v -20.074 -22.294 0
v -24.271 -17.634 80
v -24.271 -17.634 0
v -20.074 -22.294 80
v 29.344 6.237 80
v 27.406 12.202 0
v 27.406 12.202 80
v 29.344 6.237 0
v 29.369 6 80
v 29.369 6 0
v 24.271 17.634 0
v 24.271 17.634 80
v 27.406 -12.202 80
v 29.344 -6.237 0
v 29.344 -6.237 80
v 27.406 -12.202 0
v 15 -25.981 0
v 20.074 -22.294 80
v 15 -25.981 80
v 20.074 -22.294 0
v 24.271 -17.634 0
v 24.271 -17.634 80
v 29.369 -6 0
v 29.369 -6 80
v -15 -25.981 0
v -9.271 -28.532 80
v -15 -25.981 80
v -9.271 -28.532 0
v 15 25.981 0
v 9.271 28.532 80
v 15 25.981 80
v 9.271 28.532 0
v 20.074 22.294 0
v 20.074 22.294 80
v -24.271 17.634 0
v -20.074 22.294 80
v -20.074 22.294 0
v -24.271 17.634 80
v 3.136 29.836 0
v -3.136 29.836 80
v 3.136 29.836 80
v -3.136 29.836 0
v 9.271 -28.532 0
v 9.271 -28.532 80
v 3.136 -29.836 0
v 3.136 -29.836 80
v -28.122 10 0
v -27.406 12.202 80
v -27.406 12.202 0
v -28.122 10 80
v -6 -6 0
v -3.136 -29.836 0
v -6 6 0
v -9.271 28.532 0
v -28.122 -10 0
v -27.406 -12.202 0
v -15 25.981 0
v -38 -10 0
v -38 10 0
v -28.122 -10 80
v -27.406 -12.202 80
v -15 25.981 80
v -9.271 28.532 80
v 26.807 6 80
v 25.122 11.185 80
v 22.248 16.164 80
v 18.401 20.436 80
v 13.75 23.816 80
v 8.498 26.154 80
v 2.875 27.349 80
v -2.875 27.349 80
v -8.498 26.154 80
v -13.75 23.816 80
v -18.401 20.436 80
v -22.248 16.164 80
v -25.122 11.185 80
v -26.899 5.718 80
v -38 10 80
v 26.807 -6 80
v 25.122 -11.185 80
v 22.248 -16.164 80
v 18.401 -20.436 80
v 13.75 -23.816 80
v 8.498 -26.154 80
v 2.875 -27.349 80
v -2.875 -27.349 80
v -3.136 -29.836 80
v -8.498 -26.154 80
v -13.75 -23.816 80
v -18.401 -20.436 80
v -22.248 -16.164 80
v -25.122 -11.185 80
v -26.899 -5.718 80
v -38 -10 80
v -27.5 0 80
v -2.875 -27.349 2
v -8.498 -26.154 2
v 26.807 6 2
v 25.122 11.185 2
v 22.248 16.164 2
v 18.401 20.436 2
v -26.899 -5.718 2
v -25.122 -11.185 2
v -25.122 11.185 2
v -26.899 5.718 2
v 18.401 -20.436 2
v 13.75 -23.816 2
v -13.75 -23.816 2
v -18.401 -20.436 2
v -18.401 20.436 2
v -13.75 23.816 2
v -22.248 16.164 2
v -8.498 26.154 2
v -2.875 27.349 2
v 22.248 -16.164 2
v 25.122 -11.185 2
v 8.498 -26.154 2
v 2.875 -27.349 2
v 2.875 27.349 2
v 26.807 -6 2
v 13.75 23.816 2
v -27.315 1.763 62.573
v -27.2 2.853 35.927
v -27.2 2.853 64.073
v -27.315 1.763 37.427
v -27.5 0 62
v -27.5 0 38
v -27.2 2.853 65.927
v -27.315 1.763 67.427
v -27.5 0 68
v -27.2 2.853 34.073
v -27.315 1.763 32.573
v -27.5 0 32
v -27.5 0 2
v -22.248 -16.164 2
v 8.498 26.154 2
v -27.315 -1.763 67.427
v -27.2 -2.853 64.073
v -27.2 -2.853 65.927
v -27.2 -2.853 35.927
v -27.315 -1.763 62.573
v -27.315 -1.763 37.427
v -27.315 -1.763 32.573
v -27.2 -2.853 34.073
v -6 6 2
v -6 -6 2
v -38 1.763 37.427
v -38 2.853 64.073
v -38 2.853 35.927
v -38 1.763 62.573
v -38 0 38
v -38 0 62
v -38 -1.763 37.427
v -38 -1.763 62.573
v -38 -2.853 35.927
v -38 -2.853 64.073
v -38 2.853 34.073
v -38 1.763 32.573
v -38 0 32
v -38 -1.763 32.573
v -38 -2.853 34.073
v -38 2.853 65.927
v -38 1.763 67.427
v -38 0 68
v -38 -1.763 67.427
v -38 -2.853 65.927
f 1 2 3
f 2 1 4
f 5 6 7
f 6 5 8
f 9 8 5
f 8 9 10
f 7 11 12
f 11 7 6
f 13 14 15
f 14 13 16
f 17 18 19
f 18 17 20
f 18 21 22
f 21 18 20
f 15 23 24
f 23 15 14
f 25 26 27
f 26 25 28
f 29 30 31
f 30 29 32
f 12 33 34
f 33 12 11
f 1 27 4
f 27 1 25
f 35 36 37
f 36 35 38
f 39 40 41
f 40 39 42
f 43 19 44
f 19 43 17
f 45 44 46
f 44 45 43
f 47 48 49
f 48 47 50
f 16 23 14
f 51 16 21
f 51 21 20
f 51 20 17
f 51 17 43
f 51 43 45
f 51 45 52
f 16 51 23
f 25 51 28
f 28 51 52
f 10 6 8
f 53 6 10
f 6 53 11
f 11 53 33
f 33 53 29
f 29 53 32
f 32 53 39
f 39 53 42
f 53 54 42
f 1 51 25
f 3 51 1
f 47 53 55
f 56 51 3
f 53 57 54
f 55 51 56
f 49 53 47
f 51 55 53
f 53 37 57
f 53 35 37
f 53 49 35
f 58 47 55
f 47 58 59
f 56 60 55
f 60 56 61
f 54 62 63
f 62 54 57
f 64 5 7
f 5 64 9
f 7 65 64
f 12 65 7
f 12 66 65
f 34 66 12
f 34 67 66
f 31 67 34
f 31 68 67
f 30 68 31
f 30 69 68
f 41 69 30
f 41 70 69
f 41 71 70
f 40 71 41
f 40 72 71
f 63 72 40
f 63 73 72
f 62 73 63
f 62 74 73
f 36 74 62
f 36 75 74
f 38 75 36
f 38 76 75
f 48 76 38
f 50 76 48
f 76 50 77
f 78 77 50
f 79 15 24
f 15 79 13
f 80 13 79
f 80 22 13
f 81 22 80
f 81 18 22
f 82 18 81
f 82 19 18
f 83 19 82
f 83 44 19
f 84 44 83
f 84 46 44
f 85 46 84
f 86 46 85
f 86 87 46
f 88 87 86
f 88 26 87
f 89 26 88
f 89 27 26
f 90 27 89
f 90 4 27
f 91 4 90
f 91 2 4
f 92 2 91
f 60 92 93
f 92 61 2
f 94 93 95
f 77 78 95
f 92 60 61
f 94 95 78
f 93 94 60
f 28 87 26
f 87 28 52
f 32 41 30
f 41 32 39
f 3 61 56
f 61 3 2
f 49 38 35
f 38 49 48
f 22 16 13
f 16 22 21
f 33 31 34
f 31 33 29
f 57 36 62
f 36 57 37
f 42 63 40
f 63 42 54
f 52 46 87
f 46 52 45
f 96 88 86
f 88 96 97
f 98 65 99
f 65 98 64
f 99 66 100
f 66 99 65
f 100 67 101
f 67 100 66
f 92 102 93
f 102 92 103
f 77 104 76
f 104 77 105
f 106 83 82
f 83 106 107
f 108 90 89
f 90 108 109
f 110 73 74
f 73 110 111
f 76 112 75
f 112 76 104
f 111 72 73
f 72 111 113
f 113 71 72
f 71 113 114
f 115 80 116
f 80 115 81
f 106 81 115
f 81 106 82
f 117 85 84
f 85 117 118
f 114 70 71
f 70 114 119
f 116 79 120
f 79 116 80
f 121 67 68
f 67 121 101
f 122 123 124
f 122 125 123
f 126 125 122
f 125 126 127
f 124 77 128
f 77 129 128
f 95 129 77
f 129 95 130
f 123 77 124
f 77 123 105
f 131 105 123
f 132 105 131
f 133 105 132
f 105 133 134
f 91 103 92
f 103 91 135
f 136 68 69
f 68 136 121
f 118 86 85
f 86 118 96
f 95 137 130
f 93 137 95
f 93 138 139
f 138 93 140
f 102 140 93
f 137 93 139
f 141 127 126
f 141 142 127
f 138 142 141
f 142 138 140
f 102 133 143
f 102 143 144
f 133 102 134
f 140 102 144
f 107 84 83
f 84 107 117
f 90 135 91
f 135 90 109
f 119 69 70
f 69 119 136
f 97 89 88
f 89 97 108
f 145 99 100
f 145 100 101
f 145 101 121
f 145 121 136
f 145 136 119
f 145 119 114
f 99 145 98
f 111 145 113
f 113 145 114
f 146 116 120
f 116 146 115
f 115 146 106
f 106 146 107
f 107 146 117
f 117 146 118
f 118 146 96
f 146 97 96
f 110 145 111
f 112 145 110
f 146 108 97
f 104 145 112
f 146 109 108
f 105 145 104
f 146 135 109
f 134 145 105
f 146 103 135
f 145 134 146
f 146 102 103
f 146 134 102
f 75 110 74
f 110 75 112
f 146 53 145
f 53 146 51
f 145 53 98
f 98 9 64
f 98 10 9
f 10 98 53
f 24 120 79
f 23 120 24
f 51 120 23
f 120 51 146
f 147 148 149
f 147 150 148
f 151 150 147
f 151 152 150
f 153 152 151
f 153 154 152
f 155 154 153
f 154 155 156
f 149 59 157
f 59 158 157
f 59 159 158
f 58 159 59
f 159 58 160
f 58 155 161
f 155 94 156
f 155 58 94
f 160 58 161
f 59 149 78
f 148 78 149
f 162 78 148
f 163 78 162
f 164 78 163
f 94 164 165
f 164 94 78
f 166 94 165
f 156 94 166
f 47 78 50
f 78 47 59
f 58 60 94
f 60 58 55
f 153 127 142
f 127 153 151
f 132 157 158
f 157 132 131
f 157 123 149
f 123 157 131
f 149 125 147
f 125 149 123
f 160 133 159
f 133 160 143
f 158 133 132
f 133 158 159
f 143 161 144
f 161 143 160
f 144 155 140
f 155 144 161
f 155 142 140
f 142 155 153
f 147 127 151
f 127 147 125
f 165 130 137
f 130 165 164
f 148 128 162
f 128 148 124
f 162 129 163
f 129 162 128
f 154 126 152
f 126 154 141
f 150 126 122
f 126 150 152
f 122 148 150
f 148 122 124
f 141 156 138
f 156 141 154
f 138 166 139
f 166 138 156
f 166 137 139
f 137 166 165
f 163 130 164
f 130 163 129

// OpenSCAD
difference()
{
    union()
    {
        difference()
        {
            cylinder(d=60,h=80);
            translate([0,0,2]) cylinder(d=55,h=80);
            translate([-6,-6,-2]) cube([50,12,90]);
        }
        translate([-38,-10,0]) cube([10,20,80]);
    }
    translate([-40,0,35]) rotate([0,90,0]) cylinder(h=15,d=6);
    translate([-40,0,65]) rotate([0,90,0]) cylinder(h=15,d=6);
}
